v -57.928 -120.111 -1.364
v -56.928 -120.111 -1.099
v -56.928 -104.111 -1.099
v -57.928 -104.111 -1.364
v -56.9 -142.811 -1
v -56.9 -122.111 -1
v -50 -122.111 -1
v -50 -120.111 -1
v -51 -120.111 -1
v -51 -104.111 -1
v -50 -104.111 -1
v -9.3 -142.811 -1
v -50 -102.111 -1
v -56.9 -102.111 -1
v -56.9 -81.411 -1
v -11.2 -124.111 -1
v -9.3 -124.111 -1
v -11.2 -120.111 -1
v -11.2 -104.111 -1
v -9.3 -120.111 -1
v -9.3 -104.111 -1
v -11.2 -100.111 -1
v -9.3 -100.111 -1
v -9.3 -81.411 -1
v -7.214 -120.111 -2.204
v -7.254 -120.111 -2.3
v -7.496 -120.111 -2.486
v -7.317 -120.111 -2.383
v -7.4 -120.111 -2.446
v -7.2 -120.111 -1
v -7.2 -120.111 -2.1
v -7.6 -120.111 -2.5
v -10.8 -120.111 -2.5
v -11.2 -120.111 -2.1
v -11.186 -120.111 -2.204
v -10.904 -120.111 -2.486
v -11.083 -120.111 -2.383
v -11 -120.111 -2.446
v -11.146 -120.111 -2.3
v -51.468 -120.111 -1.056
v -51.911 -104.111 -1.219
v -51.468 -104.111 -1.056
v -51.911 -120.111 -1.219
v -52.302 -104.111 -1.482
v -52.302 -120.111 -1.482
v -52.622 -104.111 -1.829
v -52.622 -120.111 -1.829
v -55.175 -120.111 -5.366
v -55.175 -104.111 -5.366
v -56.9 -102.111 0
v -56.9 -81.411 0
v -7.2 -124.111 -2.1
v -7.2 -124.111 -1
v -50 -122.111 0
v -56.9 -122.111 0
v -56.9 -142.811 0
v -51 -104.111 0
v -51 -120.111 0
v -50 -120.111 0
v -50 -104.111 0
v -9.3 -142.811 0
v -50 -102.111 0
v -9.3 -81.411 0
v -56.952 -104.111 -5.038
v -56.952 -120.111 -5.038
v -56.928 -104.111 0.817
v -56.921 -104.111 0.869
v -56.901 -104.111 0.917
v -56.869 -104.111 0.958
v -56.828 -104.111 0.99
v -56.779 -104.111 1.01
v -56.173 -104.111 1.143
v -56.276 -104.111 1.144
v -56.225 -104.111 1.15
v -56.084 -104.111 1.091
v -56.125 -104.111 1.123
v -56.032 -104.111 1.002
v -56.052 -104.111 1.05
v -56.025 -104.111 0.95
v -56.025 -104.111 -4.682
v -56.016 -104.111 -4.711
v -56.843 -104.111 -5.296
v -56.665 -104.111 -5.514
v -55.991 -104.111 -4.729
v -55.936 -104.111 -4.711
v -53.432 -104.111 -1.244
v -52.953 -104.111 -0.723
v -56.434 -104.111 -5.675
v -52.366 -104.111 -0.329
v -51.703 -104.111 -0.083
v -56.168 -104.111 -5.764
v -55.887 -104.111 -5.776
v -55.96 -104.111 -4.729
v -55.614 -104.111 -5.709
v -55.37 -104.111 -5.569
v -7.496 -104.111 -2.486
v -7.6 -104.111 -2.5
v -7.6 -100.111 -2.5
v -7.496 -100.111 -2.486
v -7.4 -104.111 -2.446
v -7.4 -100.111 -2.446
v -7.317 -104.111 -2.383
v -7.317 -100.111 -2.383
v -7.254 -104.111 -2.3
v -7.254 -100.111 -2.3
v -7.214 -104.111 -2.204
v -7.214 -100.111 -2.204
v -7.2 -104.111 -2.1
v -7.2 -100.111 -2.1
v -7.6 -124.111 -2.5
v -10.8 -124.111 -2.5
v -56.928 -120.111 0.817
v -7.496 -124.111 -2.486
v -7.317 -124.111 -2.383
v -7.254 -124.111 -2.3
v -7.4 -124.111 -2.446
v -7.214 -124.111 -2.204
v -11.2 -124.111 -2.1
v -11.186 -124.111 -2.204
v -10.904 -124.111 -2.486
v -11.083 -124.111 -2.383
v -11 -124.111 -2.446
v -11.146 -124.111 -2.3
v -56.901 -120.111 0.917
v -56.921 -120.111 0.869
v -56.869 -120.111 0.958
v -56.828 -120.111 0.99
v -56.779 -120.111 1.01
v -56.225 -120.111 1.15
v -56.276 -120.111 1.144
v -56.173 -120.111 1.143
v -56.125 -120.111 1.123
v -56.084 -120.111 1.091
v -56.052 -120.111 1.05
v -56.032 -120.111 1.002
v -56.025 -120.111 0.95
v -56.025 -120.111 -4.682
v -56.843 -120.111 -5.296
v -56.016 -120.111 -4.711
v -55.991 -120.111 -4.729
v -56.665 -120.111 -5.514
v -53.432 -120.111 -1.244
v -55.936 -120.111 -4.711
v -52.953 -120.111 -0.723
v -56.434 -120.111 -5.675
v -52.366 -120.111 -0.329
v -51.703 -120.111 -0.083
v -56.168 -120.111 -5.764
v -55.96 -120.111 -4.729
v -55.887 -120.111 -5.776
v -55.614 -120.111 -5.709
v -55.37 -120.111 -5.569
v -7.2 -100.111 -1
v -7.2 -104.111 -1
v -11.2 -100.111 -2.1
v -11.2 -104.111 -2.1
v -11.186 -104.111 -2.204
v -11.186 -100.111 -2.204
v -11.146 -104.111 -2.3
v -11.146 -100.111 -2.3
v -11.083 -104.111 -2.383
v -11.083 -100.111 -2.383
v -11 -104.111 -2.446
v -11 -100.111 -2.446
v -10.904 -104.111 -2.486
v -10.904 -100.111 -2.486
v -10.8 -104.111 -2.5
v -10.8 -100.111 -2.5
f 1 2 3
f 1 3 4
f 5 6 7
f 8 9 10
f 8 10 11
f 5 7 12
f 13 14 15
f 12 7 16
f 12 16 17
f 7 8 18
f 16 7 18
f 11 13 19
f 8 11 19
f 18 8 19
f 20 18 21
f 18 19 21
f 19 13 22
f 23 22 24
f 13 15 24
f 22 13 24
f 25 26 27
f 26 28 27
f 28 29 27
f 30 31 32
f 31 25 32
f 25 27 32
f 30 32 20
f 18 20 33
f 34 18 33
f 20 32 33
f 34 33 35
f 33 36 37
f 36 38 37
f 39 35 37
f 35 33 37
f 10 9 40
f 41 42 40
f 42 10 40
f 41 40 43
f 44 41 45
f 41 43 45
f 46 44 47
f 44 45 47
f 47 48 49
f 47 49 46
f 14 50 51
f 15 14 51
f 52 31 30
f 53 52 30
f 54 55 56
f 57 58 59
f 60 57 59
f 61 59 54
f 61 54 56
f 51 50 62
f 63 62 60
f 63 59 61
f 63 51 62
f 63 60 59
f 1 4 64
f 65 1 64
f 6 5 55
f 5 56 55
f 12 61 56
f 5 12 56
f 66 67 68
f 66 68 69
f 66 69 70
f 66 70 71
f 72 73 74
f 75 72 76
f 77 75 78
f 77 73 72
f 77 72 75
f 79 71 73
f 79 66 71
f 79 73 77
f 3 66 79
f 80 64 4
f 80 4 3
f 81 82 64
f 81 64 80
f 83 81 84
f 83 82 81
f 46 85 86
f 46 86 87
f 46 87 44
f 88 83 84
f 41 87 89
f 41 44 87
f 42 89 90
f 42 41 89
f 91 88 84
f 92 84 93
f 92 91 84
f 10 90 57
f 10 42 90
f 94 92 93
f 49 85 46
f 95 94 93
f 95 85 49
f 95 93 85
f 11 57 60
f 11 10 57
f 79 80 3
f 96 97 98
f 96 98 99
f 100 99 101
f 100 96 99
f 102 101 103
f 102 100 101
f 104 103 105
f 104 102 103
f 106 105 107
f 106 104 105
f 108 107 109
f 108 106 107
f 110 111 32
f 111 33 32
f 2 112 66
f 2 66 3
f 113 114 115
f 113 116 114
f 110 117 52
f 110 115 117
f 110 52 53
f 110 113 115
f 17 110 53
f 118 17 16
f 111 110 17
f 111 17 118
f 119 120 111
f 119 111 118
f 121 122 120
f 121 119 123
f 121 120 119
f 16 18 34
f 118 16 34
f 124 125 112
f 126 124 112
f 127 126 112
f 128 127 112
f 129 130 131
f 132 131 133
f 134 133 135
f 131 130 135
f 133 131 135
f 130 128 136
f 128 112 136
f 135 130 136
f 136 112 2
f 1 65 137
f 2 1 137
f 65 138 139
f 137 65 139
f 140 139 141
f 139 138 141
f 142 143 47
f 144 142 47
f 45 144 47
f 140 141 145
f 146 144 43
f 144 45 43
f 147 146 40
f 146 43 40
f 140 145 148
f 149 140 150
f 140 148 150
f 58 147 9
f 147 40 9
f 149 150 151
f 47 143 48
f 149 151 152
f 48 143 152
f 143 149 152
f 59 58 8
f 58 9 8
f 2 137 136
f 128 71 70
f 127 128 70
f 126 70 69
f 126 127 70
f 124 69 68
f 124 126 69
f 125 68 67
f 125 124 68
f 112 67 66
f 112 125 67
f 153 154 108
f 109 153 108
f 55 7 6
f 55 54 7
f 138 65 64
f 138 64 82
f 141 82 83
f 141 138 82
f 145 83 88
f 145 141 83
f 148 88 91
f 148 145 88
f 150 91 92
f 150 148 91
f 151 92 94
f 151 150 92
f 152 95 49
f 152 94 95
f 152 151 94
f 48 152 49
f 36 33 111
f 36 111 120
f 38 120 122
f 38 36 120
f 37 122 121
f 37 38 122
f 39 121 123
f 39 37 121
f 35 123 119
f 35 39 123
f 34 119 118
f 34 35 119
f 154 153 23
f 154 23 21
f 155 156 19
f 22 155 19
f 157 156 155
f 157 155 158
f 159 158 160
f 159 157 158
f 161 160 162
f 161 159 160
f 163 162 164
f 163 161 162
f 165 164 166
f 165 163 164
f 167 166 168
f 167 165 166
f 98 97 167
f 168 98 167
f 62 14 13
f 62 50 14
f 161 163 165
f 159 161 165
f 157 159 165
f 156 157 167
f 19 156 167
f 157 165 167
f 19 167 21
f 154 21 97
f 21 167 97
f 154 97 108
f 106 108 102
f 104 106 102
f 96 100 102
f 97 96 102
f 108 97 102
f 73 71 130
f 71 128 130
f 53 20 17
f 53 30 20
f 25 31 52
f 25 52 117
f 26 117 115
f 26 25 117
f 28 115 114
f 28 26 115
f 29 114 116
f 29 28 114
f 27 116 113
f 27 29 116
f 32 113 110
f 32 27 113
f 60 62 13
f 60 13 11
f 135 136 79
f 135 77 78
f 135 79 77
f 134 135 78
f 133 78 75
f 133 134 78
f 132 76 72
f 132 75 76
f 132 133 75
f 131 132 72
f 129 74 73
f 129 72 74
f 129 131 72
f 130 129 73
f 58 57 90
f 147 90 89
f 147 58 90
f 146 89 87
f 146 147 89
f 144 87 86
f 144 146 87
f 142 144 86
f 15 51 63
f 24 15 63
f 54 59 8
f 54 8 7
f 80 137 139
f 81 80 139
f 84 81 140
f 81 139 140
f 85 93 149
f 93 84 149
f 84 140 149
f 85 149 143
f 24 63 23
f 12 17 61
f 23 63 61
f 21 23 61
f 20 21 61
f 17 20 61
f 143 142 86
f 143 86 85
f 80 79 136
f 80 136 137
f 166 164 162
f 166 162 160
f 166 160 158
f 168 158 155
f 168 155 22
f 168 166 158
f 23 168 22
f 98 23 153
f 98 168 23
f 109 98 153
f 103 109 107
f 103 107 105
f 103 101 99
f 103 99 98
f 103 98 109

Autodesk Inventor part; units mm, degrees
ref_plane "YZ Plane" through (0, 0, 0) normal (1, 0, 0) x (0, 1, 0)
ref_plane "Work Plane1" through (0, 0, 0) normal (0, 0, 1) x (1, 0, 0)
sketch "Sketch1" plane through (0, 0, 0) normal (0, 0, 1) x (1, 0, 0)
  line L0 (-60, -142.911) -> (-60, -152.111) construction
  line L1 (0, -152.111) -> (-60, -152.111) construction
  line L2 (0, -142.911) -> (0, -152.111) construction
  line L3 (-57, -81.311) -> (-9.2, -81.311)
  line L4 (-9.2, -81.311) -> (-9.2, -142.911)
  line L5 (-9.2, -142.911) -> (-57, -142.911)
  line L6 (-57, -142.911) -> (-57, -81.311)
  line L7 (-57, -112.111) -> (-9.2, -112.111) construction
  line L8 (-57, -102.111) -> (-50, -102.111)
  line L9 (-50, -102.111) -> (-50, -122.111)
  line L10 (-50, -122.111) -> (-57, -122.111)
  line L11 (-57, -122.111) -> (-57, -102.111)
  line L12 (0, -142.911) -> (-60, -142.911) projected
  point P0 (0, 0)
  dimension "d0" = 20
  dimension "d1" = 7
extrude "Extrusion1" add sketch "Sketch1" against normal blind 1 contours L3 L4 L5 L6 L10 L9 L8
ref_plane "Work Plane2" through (-57, -112.111, 0) normal (0, 1, 0) x (1, 0, 0)
sketch "Sketch2" plane through (-57, -112.111, 0) normal (0, 1, 0) x (1, 0, 0)
  line L0 (7, 0) -> (0, 0) construction
  line L1 (7, 0) -> (7, 1) construction
  line L2 (0, 1) -> (7, 1) construction
  line L3 (0, 0) -> (0, 1) construction
  line L4 (0.0721, -0.8167) -> (0.0721, 1.0988)
  line L5 (0.0721, 1.0988) -> (-0.9279, 1.3644)
  line L6 (-0.9279, 1.3644) -> (0.0477, 5.0375)
  arc A0 (1.8249, 5.3661) -> (0.0477, 5.0375) centre (1.0142, 4.7807) ccw
  line L7 (1.8249, 5.3661) -> (4.3785, 1.8293)
  arc A1 (4.3785, 1.8293) -> (6, 1) centre (6, 3) ccw
  line L8 (6, 1) -> (7, 1)
  line L9 (7, 1) -> (7, 0)
  line L10 (7, 0) -> (6, 0)
  arc A2 (3.5677, 1.2439) -> (6, 0) centre (6, 3) ccw
  line L11 (3.5677, 1.2439) -> (1.0644, 4.7112)
  arc A3 (1.0644, 4.7112) -> (0.9749, 4.6822) centre (1.0243, 4.6822) ccw
  line L12 (47.8, 0) -> (0, 0) projected
  line L13 (47.8, 1) -> (0, 1) projected
  line L14 (6, 0) -> (6, 1) construction
  line L15 (0.9749, -0.9502) -> (0.9749, 4.6822)
  line L16 (0.2208, -1.01) -> (0.7236, -1.1435)
  arc A4 (0.7236, -1.1435) -> (0.9749, -0.9502) centre (0.7749, -0.9502) ccw
  arc A5 (0.0721, -0.8167) -> (0.2208, -1.01) centre (0.2721, -0.8167) ccw
  point P0 (57, 0)
  point P1 (0.9749, -1.2103)
  point P2 (0.0721, -0.9705)
  dimension "d8" = 1
  dimension "d9" = 1
  dimension "d11" = 1
  dimension "d12" = 0.0494
  dimension "d22" = 1
  dimension "d23" = 2
  dimension "d32" = 2
  dimension "d34" = 2.5
  dimension "d36" = 0.2
  dimension "d37" = 0.9874
  dimension "d38" = 1
  dimension "d39" = 125.829
  dimension "d40" = 3.8003
extrude "Extrusion2" add sketch "Sketch2" along normal mid plane 16 contours L4 L12 L15 A4 L16 A5 | L4 L13 L15 L12 | L4 L5 L6 A0 L7 A1 L13 A2 L11 A3 L15 | A2 L13 L8 L9 L10
ref_plane "Work Plane3" through (-57, -102.111, 0) normal (0, 1, 0) x (1, 0, 0)
sketch "Sketch4" plane through (-57, -102.111, 0) normal (0, 1, 0) x (1, 0, 0)
  line L0 (57, 0) -> (-3, 0) construction
  line L1 (0, 0) -> (47.8, 0) construction
  line L2 (47.8, 0) -> (47.8, 1) construction
  line L3 (0, 1) -> (47.8, 1) construction
  line L4 (0, 0) -> (0, 1) construction
  line L5 (0, 1) -> (47.8, 1) projected
  line L6 (45.8, 1) -> (47.8, 1)
  line L7 (47.8, 1) -> (49.8, 1)
  line L8 (49.8, 1) -> (49.8, 2.1)
  line L9 (49.4, 2.5) -> (46.2, 2.5)
  line L10 (45.8, 2.1) -> (45.8, 1)
  arc A0 (49.8, 2.1) -> (49.4, 2.5) centre (49.4, 2.1) ccw
  arc A1 (46.2, 2.5) -> (45.8, 2.1) centre (46.2, 2.1) ccw
  point P0 (49.8, 2.5)
  dimension "d25" = 1.5
  dimension "d26" = 2
  dimension "d27" = 2
  dimension "d28" = 0.4
extrude "Extrusion3" add sketch "Sketch4" along normal mid plane 4
mirror "Mirror1" about plane through (-57, -112.111, 0) normal (0, 1, 0) of "Extrusion3"
thicken "Thicken1" operation add thickness 0.1 both sides no extend neighbours yes toward (0, 1, 0) faces at (-25.1333, -142.911, -0.3333) (-57, -135.9777, -0.3333) (-9.2, -108.111, -0.3333) (-41.0667, -81.311, -0.3333) (-57, -95.1777, -0.3333)
equation "\"d8\" = d9"
properties part number "BAcA_3"
